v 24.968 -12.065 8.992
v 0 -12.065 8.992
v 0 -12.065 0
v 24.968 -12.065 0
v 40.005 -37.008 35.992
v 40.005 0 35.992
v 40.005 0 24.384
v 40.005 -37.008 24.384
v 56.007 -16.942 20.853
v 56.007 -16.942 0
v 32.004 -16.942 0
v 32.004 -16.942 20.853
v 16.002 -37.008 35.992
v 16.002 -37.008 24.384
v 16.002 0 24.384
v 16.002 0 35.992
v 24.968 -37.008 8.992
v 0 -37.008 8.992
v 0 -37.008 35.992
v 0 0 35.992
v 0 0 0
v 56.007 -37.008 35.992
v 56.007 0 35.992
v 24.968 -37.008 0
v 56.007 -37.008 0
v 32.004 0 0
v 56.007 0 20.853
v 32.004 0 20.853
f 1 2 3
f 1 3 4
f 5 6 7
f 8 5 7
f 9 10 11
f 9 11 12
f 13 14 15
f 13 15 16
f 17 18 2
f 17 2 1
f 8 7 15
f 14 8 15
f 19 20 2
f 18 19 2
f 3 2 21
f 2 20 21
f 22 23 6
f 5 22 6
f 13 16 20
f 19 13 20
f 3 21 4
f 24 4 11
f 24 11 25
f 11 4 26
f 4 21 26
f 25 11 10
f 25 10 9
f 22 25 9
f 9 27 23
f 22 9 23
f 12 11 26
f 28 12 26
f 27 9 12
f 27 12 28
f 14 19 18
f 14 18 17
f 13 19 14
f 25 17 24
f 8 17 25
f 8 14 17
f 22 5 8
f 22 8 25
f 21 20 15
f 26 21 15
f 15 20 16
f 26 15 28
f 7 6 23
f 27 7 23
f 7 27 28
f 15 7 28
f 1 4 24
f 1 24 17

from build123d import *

# Parameters (mm, degrees)
F1_DEPTH = 37.0078
F2_W     = 24.9682
F2_H     = 8.9916
F3_DEPTH = 24.9428
F4_W     = 16.9418
F4_H     = 20.8534
F5_DEPTH = 24.003


with BuildPart() as f1:
    # F0 (on Front) → F1 (new body)
    with BuildSketch(Plane.XZ):
        Polygon((0, 35.9918), (0, 0), (56.007, 0), (56.007, 35.9918), (40.005, 35.9918), (40.005, 24.384), (16.002, 24.384), (16.002, 35.9918), align=None)
    extrude(amount=F1_DEPTH)

    # F2 (on face) → F3 (cut)
    with BuildSketch(Plane.XZ.offset(37.0078)):
        with Locations((12.4841, 4.4958)):
            Rectangle(F2_W, F2_H)
    extrude(amount=-F3_DEPTH, mode=Mode.SUBTRACT)

    # F4 (on face) → F5 (cut)
    with BuildSketch(Plane.YZ.offset(56.007)):
        with Locations((-8.4709, 10.4267)):
            Rectangle(F4_W, F4_H)
    extrude(amount=-F5_DEPTH, mode=Mode.SUBTRACT)


solid = f1.part
